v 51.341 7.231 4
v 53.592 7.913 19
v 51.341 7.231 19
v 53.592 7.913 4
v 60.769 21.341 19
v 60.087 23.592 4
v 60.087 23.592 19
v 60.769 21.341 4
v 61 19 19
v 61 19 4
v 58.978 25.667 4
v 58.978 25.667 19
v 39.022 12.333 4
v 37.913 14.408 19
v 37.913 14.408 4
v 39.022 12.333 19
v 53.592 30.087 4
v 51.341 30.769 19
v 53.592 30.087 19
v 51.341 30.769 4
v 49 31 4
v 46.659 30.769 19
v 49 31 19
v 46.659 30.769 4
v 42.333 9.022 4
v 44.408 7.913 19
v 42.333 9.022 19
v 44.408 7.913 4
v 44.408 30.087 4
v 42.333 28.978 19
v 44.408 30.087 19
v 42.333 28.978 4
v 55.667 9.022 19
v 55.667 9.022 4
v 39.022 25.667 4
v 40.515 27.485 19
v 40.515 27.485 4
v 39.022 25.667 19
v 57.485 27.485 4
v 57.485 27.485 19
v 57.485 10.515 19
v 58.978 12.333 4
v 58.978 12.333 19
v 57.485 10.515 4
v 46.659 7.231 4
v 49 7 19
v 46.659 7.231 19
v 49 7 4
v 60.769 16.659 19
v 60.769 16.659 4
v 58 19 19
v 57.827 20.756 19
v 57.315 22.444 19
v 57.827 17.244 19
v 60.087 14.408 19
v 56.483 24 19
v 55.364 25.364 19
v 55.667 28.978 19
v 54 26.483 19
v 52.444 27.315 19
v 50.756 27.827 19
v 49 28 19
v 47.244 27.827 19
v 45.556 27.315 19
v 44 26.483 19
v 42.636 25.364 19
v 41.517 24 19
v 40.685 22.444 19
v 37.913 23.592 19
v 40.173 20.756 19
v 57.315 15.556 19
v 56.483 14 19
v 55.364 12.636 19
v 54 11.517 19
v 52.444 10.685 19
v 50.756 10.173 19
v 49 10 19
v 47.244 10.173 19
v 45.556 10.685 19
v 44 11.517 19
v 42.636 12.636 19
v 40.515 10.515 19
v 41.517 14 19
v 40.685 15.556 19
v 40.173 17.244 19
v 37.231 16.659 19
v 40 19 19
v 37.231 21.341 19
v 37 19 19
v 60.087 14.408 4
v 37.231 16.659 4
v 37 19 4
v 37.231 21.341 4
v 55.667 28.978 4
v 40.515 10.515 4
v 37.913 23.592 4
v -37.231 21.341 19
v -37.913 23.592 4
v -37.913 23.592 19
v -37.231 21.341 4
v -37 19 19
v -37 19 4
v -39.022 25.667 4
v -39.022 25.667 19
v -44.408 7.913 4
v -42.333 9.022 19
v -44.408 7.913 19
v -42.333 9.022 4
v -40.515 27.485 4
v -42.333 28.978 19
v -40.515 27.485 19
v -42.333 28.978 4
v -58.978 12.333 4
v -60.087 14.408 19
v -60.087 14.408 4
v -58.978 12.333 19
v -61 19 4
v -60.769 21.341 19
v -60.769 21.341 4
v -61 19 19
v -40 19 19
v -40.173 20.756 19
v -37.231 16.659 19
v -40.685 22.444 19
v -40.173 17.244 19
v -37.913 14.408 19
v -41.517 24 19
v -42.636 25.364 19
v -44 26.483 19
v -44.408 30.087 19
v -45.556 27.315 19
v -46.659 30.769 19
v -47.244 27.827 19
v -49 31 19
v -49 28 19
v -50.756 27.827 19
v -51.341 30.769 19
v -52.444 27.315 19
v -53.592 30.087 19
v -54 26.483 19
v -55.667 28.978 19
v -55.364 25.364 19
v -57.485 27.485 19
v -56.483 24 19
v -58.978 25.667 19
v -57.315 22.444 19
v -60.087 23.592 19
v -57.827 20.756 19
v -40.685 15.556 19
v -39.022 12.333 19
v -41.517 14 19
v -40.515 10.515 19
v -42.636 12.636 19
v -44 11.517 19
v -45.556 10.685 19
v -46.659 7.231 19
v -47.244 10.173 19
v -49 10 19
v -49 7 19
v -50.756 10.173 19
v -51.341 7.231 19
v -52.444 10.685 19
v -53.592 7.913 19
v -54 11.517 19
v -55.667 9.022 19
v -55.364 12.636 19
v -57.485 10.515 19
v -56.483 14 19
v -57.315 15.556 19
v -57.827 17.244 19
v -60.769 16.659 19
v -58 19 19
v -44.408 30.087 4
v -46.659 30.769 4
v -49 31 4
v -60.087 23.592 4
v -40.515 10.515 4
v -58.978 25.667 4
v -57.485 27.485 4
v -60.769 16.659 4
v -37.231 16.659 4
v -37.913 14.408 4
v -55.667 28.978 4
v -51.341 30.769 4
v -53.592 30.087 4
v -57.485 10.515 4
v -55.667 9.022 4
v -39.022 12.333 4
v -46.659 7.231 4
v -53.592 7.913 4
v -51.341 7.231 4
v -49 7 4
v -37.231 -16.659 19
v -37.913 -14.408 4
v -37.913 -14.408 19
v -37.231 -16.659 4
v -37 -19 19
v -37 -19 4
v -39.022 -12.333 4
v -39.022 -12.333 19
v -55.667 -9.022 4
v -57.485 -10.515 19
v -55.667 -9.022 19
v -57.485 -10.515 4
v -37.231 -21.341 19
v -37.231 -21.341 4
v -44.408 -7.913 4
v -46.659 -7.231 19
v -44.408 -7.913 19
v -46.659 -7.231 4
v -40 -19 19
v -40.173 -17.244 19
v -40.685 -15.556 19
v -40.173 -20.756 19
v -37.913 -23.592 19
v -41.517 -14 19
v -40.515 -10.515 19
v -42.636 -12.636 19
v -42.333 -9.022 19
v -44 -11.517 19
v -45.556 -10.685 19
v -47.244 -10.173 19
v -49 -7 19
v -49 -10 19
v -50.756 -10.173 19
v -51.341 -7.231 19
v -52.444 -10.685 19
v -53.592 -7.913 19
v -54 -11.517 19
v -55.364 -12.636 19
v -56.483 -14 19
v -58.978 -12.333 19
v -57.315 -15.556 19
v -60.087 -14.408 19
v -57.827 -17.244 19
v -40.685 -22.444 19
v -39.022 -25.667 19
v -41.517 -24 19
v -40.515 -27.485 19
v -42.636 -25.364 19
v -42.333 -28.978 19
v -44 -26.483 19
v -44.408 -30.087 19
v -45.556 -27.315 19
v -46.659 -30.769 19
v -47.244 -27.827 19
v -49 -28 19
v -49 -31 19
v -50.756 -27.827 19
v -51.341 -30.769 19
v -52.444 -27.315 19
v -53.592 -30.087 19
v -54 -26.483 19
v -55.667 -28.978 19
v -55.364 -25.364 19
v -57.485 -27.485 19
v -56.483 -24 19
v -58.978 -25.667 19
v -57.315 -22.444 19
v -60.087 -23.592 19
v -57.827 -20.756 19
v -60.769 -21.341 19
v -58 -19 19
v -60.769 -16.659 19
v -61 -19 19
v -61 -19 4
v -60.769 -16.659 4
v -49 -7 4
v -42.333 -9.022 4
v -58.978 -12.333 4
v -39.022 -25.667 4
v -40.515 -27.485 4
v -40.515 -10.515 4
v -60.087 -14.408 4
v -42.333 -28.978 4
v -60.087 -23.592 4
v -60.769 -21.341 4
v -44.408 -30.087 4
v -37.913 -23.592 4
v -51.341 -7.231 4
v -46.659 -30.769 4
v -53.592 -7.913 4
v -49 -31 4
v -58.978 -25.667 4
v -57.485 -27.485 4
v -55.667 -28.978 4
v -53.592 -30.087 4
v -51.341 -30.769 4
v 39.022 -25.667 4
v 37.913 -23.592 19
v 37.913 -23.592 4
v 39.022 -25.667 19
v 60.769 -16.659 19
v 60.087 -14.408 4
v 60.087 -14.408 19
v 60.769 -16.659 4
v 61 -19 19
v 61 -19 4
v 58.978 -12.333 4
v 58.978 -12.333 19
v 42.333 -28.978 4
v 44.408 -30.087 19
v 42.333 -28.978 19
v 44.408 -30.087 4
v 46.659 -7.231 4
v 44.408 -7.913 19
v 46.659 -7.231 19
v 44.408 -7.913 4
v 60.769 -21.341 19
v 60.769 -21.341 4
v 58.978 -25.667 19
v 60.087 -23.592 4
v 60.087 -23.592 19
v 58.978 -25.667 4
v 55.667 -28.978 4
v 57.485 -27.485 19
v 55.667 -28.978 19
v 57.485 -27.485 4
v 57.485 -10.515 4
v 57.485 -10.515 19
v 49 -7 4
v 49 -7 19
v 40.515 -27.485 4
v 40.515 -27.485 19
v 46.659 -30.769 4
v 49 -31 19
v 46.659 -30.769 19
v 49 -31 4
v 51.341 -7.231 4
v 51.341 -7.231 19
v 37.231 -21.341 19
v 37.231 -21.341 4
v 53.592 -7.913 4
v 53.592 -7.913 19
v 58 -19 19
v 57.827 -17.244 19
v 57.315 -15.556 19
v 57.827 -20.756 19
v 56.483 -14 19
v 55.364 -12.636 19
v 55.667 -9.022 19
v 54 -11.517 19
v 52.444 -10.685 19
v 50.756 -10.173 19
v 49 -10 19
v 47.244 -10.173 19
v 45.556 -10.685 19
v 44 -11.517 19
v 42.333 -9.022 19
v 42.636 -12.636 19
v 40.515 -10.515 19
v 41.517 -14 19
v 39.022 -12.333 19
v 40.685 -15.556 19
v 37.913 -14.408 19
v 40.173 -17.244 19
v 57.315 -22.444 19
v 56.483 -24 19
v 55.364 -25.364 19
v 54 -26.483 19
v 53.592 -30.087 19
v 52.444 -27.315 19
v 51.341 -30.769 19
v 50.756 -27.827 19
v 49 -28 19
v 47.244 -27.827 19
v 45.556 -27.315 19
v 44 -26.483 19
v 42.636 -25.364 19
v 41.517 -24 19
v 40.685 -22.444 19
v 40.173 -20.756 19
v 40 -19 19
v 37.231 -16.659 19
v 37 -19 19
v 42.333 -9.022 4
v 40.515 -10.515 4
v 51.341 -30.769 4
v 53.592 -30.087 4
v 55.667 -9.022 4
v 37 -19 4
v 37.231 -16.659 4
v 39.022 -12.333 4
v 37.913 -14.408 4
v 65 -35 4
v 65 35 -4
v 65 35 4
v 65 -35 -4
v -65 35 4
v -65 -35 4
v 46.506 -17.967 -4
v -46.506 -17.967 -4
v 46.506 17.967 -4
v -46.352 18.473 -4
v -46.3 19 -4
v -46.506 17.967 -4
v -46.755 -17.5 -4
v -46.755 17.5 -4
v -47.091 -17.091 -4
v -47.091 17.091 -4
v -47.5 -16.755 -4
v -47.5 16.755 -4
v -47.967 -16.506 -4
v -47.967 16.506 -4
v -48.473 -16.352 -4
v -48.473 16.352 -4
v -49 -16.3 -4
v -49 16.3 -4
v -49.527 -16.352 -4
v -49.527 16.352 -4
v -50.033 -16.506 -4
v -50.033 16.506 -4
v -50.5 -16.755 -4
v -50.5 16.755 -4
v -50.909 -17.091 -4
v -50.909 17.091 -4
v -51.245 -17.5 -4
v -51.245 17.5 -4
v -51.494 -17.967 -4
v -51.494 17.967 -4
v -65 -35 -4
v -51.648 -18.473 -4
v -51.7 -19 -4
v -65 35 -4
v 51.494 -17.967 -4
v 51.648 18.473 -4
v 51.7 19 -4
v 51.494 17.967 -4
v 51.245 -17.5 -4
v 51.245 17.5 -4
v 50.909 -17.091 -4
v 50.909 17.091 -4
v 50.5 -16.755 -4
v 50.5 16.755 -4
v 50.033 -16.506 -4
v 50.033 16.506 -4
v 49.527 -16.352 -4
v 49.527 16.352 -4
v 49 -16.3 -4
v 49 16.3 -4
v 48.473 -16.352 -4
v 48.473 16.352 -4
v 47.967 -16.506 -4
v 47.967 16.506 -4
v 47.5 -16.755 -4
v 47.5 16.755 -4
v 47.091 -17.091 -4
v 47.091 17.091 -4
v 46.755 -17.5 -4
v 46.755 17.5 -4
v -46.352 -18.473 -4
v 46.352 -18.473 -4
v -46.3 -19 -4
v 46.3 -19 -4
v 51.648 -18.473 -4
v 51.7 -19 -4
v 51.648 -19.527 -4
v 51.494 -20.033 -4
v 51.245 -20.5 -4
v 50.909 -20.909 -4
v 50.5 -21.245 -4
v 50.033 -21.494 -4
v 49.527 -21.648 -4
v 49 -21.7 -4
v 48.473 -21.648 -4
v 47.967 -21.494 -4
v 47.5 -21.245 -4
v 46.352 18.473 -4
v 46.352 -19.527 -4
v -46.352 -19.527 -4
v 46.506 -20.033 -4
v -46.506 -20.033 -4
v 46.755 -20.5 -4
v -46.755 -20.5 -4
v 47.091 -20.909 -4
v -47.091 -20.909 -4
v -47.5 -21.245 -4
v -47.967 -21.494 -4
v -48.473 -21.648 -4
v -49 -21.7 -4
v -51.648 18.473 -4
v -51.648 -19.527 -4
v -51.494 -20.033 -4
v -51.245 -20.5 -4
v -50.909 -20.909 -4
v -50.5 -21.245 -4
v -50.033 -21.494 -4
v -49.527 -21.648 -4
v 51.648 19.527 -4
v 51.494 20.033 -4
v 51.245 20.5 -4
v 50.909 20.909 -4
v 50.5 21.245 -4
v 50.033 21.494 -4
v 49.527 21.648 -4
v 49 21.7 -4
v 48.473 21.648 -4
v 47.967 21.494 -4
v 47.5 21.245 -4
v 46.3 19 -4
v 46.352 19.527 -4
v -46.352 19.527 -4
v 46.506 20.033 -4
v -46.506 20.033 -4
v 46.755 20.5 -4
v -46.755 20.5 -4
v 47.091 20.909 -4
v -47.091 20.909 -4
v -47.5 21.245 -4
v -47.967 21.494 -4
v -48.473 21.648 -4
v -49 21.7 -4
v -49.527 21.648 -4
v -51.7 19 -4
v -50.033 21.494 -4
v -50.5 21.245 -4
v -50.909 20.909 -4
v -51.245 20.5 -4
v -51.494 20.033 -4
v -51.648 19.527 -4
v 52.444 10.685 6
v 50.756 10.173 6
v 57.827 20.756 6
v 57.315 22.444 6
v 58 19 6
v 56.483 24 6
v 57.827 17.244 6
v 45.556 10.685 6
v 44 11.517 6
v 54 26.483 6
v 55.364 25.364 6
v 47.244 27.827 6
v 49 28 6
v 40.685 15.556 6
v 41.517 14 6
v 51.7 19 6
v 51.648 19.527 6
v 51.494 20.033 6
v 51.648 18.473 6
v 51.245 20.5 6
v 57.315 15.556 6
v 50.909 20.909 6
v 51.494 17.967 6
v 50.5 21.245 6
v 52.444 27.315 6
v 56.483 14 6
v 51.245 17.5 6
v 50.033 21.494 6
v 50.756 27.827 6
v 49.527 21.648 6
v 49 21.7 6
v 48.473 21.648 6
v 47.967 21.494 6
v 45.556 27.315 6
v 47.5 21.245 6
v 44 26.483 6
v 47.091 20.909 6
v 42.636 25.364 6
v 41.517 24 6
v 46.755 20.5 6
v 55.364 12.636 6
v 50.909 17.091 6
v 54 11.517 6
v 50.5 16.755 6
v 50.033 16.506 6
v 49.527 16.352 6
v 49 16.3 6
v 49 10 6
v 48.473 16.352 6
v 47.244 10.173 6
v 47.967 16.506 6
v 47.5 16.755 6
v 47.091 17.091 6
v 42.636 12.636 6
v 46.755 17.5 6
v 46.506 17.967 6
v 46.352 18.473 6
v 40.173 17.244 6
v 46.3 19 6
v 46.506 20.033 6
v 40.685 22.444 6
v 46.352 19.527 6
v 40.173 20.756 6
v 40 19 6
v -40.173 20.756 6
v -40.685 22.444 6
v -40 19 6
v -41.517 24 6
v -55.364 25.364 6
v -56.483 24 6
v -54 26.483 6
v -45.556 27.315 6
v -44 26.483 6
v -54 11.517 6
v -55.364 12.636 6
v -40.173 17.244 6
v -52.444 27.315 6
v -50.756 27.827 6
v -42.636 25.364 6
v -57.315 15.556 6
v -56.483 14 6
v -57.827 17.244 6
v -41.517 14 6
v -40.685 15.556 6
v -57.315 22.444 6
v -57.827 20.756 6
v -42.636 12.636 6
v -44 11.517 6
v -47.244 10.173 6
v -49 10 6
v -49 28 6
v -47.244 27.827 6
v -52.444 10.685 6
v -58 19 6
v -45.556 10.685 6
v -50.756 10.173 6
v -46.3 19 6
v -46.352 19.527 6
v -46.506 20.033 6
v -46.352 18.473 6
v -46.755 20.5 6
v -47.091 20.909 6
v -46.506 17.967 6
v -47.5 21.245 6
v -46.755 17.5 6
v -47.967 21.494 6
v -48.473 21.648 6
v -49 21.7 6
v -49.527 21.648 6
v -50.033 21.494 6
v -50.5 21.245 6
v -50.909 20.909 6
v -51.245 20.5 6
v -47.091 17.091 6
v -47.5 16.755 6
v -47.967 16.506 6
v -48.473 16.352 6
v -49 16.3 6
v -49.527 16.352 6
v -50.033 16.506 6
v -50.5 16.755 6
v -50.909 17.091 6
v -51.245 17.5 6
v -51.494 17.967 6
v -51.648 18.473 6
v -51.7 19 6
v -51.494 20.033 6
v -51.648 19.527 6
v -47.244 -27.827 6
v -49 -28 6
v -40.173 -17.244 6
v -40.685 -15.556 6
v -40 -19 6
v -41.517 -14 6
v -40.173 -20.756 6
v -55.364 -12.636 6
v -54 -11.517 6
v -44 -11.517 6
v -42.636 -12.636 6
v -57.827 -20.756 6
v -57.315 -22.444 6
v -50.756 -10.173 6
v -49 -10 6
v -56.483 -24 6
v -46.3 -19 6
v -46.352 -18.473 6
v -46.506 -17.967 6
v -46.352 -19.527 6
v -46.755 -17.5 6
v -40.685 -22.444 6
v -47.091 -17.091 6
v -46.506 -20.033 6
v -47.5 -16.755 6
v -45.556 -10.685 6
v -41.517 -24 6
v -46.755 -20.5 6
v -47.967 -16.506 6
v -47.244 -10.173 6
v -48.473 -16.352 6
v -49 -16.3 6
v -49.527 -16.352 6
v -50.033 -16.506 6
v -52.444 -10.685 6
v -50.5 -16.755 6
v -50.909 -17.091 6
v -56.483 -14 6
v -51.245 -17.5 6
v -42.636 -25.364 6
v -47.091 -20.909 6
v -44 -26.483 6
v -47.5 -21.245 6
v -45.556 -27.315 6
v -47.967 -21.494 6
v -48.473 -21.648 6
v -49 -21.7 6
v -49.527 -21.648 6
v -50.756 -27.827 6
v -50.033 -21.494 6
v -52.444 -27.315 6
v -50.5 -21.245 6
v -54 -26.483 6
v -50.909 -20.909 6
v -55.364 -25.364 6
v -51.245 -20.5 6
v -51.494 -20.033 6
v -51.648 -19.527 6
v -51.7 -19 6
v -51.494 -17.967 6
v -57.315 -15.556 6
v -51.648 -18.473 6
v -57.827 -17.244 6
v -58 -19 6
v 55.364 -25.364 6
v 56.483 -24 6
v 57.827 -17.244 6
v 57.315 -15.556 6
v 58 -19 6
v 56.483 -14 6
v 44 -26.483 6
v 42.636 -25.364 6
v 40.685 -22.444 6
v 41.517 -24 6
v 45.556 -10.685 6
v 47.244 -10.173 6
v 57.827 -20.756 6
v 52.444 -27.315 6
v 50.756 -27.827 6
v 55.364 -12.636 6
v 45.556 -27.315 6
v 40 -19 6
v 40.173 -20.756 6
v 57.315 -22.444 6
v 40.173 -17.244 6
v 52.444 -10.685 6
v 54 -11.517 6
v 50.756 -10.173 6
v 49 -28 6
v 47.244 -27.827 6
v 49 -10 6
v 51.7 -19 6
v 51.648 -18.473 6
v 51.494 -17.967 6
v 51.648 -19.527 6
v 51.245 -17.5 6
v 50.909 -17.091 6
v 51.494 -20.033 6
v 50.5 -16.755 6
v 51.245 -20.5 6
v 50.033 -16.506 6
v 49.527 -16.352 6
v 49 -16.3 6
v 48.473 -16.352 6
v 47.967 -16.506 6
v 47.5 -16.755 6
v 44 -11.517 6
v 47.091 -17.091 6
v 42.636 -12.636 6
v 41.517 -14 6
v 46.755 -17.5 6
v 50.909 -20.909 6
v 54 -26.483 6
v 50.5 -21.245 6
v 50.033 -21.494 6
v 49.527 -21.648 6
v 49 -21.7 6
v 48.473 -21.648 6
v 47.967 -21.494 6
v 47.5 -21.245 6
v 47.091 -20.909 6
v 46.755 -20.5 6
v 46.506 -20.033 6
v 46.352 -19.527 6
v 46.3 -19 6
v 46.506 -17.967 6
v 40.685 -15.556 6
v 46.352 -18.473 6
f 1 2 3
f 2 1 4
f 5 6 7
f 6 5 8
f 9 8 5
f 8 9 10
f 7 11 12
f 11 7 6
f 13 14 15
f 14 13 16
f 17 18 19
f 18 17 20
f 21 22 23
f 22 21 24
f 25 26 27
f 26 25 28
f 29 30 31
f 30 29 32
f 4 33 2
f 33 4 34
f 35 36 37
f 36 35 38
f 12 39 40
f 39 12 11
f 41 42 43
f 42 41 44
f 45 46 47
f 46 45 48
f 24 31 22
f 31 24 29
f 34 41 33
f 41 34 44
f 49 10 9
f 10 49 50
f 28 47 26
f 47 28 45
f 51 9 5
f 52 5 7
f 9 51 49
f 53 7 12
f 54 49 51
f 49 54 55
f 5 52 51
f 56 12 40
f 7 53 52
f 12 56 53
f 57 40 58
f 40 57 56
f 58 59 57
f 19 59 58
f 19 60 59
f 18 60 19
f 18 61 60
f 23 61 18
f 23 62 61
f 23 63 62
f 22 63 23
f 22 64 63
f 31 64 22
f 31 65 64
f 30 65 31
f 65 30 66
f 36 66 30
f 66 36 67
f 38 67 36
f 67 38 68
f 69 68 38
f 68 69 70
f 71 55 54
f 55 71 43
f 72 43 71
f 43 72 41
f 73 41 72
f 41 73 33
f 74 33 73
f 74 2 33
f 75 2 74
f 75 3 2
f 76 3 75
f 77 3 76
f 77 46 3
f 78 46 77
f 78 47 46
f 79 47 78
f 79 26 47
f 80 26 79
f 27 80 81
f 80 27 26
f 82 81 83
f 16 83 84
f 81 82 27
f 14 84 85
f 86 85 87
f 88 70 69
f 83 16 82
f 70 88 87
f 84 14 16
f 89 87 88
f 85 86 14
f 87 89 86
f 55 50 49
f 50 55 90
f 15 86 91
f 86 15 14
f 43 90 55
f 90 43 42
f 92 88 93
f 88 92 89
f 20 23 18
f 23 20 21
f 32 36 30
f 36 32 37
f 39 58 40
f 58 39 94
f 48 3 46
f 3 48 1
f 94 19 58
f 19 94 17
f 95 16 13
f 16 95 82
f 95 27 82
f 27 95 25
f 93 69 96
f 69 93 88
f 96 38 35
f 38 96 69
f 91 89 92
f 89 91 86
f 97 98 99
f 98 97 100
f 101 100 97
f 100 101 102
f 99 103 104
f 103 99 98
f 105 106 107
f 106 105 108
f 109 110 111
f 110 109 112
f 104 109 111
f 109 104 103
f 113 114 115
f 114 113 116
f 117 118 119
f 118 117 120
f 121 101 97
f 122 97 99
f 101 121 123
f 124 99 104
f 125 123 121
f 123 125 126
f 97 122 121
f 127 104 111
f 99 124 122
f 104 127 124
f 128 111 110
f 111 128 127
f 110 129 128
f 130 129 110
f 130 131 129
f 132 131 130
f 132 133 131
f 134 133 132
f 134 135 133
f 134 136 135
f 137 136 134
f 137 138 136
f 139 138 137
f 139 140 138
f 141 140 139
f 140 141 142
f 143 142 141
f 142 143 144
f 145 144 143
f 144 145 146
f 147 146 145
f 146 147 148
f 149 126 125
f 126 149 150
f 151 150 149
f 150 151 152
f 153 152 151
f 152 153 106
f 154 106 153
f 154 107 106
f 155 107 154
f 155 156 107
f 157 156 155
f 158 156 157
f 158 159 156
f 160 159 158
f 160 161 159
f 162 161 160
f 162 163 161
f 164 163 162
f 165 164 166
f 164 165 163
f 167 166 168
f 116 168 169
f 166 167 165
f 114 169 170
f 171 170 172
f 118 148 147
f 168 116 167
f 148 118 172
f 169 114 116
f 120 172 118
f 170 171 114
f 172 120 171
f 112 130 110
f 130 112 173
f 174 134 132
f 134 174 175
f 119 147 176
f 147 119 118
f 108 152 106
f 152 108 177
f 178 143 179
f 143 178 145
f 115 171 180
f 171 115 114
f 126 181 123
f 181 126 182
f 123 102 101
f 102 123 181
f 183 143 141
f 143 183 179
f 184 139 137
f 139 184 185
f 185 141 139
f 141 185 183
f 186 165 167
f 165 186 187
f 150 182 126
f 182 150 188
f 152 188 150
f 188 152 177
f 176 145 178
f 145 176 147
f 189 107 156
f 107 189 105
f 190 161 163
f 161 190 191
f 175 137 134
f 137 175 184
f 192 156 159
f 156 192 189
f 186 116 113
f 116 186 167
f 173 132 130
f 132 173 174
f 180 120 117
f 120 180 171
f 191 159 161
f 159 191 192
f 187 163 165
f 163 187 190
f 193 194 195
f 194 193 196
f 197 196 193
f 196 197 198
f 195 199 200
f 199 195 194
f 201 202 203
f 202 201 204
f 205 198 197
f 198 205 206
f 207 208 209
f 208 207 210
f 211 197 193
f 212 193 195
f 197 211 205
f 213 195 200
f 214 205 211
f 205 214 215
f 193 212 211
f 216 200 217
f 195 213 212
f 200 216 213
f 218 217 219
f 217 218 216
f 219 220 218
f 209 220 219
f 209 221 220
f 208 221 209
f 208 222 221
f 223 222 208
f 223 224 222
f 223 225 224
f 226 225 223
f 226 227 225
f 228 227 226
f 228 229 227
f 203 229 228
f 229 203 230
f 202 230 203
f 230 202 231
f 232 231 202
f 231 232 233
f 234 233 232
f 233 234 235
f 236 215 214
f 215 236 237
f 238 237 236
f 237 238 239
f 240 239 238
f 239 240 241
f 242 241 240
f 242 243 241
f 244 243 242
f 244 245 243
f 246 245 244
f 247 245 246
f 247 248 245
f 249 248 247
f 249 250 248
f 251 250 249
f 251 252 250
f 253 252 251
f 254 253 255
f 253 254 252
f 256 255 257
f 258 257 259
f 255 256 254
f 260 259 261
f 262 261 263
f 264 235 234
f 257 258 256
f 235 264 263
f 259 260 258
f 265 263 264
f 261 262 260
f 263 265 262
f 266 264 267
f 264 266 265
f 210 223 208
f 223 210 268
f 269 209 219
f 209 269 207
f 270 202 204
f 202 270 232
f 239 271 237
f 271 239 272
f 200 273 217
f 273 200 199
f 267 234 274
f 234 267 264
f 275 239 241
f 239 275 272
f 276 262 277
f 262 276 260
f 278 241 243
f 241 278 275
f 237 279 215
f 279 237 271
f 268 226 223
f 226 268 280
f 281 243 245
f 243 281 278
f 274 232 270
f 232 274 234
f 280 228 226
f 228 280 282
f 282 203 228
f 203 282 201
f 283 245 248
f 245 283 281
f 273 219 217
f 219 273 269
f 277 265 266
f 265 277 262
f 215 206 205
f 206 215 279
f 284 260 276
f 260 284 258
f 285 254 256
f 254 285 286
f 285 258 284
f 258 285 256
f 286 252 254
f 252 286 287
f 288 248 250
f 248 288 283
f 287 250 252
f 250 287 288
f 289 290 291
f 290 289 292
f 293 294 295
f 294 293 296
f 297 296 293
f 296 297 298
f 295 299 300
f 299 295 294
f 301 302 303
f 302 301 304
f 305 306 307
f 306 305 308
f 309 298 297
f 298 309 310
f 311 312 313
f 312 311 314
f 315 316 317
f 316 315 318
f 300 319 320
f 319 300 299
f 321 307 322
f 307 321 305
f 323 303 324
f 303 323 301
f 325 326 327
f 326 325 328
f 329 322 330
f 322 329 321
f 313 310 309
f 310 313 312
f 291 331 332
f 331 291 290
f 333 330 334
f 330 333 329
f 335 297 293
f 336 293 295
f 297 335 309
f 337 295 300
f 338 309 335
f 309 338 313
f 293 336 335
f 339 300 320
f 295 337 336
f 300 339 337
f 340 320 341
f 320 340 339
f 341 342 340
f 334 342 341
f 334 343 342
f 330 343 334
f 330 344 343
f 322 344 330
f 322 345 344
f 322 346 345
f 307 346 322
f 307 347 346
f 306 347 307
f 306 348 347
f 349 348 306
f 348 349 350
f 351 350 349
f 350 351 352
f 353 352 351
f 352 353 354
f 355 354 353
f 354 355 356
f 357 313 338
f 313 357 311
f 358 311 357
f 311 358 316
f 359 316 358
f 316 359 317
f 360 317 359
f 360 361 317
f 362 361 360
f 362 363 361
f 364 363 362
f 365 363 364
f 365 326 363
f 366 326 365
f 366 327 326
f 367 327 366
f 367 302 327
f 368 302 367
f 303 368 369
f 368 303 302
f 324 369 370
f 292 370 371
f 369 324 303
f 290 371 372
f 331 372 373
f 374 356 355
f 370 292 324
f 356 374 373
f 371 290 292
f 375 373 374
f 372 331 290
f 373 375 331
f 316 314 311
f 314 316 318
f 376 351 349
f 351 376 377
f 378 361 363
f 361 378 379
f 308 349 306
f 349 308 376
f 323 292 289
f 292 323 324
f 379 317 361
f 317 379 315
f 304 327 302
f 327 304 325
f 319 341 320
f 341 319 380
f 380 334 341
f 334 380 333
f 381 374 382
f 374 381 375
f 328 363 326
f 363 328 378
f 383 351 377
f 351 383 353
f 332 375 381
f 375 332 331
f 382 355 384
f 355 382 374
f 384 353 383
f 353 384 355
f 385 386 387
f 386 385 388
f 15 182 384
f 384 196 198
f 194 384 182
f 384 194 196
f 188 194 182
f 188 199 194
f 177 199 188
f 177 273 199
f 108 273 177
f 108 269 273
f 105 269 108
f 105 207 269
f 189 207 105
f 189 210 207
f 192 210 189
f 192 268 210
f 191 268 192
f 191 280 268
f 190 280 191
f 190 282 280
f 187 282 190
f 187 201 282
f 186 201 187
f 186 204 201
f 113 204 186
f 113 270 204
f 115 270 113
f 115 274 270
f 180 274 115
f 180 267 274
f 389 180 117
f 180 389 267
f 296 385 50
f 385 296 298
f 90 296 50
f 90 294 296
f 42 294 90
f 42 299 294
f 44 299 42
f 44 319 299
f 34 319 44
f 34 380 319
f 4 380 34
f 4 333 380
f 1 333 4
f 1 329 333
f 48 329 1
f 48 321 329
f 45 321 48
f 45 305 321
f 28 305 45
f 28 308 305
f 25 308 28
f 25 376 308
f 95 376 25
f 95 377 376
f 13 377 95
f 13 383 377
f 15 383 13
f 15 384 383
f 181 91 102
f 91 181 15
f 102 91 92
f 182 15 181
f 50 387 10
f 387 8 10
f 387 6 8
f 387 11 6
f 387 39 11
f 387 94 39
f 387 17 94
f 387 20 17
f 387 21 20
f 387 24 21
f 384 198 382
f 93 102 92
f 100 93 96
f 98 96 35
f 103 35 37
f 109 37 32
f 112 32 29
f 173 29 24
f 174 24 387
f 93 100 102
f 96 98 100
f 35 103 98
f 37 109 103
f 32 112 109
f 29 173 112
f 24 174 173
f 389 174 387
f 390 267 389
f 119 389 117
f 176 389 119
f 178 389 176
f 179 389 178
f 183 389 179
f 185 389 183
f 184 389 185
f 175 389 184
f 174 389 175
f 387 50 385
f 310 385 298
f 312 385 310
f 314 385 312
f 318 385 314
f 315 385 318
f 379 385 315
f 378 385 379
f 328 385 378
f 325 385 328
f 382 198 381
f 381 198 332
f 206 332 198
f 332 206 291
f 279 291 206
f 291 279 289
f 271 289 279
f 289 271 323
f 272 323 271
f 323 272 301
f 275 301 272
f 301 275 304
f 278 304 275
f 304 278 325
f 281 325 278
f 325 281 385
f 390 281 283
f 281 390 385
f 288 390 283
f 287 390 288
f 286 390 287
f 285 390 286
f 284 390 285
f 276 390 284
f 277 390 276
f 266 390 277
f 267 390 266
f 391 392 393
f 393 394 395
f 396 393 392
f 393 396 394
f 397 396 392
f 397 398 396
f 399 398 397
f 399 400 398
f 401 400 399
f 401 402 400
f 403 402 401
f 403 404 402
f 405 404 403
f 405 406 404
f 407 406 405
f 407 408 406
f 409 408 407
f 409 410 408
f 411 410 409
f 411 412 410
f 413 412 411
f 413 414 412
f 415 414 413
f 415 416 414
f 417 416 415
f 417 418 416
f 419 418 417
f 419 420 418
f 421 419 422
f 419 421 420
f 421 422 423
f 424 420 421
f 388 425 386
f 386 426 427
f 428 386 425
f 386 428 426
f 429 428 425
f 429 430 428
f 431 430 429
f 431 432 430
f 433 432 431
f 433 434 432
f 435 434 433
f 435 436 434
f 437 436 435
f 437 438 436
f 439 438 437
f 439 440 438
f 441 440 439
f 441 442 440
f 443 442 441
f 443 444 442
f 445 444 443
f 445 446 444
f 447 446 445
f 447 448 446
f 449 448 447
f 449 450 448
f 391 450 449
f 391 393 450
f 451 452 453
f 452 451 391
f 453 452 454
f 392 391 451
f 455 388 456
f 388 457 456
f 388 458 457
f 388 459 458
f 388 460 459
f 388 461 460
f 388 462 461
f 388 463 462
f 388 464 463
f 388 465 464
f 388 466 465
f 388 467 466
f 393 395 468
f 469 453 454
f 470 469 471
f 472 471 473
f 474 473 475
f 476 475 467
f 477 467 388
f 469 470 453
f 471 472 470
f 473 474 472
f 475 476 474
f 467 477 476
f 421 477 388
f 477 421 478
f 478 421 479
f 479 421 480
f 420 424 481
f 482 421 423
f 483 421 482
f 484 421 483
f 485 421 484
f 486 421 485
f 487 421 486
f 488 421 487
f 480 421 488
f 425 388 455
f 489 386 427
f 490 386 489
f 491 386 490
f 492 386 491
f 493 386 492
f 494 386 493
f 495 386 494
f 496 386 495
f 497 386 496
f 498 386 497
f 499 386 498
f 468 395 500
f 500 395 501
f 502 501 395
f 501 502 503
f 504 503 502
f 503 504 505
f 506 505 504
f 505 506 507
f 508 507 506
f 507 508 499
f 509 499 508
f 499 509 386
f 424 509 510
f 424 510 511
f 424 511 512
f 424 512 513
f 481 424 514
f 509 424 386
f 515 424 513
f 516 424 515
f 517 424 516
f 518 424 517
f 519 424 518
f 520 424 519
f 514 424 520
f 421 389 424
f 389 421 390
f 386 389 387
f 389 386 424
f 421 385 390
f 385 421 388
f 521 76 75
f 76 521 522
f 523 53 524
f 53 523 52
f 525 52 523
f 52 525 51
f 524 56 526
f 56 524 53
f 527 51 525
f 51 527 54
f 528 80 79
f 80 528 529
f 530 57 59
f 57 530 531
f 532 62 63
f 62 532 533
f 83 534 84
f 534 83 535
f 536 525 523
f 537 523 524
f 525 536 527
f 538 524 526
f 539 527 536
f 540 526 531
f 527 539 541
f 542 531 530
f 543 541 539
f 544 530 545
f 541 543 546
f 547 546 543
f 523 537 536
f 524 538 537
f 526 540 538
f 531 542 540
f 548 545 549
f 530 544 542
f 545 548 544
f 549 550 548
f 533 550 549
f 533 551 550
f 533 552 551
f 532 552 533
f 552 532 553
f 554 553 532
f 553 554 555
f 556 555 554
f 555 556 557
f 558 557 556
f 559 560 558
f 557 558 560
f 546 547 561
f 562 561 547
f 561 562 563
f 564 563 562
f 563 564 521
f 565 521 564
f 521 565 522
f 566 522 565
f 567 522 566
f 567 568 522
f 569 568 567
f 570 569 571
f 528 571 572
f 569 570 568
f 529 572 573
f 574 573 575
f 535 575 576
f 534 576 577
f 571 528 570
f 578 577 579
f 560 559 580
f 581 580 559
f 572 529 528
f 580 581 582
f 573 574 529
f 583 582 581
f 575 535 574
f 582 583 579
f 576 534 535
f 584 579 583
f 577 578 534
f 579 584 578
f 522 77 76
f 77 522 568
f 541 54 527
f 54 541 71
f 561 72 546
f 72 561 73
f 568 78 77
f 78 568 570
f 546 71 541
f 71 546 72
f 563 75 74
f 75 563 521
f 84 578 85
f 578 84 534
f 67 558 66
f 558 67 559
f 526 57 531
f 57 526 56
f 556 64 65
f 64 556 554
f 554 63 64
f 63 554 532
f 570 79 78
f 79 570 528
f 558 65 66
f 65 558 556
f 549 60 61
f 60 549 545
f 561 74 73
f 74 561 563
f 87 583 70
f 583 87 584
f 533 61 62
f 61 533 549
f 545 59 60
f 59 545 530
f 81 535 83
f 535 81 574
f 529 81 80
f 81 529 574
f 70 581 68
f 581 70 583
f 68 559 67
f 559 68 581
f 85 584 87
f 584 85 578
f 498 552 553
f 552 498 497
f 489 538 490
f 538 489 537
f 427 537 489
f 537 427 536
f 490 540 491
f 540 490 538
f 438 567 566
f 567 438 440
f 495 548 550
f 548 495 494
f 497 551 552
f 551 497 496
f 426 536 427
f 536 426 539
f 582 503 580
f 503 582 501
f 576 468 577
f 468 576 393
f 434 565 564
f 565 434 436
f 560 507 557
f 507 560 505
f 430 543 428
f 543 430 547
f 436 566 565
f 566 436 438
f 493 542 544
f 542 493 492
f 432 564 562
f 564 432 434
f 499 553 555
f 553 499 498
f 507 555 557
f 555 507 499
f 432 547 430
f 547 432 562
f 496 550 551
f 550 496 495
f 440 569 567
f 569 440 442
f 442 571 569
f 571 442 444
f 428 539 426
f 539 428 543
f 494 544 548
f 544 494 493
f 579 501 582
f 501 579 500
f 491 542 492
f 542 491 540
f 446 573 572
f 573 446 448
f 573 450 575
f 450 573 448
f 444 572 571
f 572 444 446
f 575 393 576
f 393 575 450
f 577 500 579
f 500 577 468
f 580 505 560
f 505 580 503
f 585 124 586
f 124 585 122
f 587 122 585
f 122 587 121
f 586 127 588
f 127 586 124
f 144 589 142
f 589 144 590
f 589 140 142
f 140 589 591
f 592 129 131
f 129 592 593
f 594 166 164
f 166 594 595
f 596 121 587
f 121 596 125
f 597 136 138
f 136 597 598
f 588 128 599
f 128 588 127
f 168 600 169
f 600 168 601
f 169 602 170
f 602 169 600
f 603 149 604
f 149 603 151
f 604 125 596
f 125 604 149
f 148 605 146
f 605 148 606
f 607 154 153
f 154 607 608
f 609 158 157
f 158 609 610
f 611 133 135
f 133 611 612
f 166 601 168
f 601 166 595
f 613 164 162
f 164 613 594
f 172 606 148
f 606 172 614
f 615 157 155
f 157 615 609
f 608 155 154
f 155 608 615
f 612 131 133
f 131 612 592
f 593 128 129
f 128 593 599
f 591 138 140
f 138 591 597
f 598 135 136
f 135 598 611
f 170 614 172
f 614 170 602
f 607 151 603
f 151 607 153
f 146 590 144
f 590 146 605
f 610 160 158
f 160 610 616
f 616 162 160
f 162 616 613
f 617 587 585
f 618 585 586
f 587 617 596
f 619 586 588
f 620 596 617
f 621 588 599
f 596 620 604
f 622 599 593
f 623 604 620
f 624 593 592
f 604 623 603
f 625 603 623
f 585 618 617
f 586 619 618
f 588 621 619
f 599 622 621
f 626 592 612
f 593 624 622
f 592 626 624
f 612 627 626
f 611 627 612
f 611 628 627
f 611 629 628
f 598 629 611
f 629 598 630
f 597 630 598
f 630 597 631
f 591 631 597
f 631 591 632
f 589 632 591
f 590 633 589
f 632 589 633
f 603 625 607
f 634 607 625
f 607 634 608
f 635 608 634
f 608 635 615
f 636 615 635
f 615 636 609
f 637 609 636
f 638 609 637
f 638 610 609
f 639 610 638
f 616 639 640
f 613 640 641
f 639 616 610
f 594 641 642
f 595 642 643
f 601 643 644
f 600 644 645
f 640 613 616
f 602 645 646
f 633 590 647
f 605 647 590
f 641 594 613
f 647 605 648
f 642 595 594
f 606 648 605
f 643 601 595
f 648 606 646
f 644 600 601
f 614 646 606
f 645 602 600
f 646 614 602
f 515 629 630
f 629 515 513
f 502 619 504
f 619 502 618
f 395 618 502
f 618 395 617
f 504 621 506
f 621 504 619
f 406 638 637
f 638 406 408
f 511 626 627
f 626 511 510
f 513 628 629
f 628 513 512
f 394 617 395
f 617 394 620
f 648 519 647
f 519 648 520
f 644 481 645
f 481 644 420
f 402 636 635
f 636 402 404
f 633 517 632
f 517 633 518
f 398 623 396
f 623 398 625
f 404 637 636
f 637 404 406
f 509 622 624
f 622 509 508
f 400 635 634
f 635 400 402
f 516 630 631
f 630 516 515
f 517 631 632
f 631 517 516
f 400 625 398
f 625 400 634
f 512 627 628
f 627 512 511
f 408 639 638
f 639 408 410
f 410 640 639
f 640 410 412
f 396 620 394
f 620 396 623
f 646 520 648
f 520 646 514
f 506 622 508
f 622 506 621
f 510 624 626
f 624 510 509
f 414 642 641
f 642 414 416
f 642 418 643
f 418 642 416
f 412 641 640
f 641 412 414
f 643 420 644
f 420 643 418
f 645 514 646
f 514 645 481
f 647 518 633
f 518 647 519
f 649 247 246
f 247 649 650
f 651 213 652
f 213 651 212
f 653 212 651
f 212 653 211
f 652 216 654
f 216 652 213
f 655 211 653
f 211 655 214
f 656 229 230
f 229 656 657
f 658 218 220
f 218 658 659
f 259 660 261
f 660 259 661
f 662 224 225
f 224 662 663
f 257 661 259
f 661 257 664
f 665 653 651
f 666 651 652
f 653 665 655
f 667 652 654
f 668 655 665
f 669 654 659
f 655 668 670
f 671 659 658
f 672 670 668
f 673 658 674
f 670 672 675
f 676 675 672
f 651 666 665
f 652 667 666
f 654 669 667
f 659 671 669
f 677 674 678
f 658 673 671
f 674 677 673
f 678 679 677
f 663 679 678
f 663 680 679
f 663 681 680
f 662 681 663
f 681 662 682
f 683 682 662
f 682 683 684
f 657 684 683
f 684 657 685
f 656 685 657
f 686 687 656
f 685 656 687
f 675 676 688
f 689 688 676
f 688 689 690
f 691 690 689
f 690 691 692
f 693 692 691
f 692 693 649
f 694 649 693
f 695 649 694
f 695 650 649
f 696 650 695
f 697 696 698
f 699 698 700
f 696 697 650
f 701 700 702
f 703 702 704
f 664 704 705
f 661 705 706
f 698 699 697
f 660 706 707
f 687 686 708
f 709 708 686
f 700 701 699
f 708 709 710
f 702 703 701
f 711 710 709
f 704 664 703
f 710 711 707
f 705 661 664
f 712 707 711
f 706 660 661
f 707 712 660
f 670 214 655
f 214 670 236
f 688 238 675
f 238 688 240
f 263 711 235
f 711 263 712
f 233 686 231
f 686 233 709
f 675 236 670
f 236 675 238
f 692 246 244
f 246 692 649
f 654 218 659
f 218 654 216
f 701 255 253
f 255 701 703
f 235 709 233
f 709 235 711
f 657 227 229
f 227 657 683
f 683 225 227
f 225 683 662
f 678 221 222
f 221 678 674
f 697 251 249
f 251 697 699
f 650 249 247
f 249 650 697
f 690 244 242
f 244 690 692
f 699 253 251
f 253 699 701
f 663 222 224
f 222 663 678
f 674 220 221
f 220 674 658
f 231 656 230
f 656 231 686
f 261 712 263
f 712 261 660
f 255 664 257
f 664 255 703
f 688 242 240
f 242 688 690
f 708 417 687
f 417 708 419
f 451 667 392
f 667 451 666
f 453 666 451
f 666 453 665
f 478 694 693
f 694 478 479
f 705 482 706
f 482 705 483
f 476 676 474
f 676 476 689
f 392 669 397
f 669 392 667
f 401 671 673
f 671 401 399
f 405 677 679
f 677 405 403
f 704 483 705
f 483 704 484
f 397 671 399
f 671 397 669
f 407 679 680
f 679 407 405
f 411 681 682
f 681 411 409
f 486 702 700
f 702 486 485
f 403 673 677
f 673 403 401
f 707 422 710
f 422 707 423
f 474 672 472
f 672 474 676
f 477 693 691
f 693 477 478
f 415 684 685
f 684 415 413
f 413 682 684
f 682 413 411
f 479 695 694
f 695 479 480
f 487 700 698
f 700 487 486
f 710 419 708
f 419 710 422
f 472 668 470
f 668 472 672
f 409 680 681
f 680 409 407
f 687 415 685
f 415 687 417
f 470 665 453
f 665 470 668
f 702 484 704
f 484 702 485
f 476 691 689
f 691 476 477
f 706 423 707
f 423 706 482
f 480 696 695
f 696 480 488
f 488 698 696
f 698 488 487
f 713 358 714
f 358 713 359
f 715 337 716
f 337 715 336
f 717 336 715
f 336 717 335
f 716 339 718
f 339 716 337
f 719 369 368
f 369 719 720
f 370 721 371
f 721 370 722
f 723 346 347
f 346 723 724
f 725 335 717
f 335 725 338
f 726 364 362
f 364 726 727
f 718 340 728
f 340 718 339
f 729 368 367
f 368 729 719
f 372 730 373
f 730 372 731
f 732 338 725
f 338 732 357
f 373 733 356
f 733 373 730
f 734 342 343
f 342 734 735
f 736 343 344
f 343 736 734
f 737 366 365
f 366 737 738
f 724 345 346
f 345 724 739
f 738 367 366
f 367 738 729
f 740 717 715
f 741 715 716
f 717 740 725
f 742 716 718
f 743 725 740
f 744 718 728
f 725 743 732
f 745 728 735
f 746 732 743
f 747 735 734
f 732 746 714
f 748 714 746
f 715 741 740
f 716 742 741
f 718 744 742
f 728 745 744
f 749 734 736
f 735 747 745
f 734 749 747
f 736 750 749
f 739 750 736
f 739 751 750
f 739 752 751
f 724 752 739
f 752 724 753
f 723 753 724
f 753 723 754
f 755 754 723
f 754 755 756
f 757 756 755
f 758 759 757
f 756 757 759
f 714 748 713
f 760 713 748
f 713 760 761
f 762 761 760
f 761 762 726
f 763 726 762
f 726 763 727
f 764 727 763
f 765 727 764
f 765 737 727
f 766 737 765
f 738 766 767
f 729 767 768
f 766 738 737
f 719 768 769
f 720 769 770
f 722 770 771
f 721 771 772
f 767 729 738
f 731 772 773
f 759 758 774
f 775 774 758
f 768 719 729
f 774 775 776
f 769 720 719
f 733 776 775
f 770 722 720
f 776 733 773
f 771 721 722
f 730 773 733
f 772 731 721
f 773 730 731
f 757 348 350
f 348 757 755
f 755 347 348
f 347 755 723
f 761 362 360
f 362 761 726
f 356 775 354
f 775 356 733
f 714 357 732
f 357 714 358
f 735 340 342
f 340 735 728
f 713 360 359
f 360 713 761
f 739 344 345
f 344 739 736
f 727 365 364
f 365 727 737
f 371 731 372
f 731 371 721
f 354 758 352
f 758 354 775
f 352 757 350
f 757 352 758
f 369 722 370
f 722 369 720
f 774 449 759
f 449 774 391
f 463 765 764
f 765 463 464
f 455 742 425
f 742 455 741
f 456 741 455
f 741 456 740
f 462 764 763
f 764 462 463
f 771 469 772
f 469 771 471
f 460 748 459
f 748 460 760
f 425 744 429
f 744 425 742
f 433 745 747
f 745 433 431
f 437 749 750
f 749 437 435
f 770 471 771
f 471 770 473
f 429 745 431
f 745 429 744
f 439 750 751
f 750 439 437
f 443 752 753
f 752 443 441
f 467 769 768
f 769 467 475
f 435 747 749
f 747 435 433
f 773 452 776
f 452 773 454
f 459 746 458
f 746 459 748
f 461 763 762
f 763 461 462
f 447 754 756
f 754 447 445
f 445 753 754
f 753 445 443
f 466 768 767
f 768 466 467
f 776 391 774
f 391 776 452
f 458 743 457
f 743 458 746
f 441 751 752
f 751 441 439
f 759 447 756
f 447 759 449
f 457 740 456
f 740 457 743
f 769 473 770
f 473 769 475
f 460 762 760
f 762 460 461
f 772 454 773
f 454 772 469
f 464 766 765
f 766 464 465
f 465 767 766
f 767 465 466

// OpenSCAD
$fn = 32;

// ----------------------------------------------------------------------
// Socket pad plate
// bosses with counterbored sockets for the screws
// ----------------------------------------------------------------------

// --- parameters (mm) ---
base_t = 8;            // base plate thickness
boss_h = 15;           // boss height above the base plate
boss_d = 24;           // boss diameter
socket_d = 18;         // socket diameter
socket_depth = 13;     // socket depth from the boss face
bolt_d = 5.4;          // screw clearance hole through the socket floor
plate = [130, 70, 8];  // overall size (x, y, z)
edge = 16;             // boss centre offset from the plate edge
pads = 4;              // boss count, one per corner

// --- derived feature positions (mm) ---
height = base_t + boss_h;        // = 23   overall height of the part
corner_x = plate[0] / 2 - edge;  // = 49   boss centre X
corner_y = plate[1] / 2 - edge;  // = 19   boss centre Y
feature_centers = [
  [corner_x, corner_y],
  [-corner_x, corner_y],
  [-corner_x, -corner_y],
  [corner_x, -corner_y]
];   // boss centres: sockets, holes and the pads themselves are placed from here

// base plate, bosses on feature_centers, socket + through hole in each
difference() {
  union() {
    cube(plate, center = true);
    for (centre = feature_centers)
      translate([centre[0], centre[1], plate[2] / 2 - 1])
        cylinder(d = boss_d, h = boss_h + 1);
  }
  for (centre = feature_centers) {
    translate([centre[0], centre[1], plate[2] / 2 + boss_h - socket_depth])
      cylinder(d = socket_d, h = socket_depth + 1);
    translate([centre[0], centre[1], -height])
      cylinder(d = bolt_d, h = 2 * height + 2);  // through the socket floor
  }
}
